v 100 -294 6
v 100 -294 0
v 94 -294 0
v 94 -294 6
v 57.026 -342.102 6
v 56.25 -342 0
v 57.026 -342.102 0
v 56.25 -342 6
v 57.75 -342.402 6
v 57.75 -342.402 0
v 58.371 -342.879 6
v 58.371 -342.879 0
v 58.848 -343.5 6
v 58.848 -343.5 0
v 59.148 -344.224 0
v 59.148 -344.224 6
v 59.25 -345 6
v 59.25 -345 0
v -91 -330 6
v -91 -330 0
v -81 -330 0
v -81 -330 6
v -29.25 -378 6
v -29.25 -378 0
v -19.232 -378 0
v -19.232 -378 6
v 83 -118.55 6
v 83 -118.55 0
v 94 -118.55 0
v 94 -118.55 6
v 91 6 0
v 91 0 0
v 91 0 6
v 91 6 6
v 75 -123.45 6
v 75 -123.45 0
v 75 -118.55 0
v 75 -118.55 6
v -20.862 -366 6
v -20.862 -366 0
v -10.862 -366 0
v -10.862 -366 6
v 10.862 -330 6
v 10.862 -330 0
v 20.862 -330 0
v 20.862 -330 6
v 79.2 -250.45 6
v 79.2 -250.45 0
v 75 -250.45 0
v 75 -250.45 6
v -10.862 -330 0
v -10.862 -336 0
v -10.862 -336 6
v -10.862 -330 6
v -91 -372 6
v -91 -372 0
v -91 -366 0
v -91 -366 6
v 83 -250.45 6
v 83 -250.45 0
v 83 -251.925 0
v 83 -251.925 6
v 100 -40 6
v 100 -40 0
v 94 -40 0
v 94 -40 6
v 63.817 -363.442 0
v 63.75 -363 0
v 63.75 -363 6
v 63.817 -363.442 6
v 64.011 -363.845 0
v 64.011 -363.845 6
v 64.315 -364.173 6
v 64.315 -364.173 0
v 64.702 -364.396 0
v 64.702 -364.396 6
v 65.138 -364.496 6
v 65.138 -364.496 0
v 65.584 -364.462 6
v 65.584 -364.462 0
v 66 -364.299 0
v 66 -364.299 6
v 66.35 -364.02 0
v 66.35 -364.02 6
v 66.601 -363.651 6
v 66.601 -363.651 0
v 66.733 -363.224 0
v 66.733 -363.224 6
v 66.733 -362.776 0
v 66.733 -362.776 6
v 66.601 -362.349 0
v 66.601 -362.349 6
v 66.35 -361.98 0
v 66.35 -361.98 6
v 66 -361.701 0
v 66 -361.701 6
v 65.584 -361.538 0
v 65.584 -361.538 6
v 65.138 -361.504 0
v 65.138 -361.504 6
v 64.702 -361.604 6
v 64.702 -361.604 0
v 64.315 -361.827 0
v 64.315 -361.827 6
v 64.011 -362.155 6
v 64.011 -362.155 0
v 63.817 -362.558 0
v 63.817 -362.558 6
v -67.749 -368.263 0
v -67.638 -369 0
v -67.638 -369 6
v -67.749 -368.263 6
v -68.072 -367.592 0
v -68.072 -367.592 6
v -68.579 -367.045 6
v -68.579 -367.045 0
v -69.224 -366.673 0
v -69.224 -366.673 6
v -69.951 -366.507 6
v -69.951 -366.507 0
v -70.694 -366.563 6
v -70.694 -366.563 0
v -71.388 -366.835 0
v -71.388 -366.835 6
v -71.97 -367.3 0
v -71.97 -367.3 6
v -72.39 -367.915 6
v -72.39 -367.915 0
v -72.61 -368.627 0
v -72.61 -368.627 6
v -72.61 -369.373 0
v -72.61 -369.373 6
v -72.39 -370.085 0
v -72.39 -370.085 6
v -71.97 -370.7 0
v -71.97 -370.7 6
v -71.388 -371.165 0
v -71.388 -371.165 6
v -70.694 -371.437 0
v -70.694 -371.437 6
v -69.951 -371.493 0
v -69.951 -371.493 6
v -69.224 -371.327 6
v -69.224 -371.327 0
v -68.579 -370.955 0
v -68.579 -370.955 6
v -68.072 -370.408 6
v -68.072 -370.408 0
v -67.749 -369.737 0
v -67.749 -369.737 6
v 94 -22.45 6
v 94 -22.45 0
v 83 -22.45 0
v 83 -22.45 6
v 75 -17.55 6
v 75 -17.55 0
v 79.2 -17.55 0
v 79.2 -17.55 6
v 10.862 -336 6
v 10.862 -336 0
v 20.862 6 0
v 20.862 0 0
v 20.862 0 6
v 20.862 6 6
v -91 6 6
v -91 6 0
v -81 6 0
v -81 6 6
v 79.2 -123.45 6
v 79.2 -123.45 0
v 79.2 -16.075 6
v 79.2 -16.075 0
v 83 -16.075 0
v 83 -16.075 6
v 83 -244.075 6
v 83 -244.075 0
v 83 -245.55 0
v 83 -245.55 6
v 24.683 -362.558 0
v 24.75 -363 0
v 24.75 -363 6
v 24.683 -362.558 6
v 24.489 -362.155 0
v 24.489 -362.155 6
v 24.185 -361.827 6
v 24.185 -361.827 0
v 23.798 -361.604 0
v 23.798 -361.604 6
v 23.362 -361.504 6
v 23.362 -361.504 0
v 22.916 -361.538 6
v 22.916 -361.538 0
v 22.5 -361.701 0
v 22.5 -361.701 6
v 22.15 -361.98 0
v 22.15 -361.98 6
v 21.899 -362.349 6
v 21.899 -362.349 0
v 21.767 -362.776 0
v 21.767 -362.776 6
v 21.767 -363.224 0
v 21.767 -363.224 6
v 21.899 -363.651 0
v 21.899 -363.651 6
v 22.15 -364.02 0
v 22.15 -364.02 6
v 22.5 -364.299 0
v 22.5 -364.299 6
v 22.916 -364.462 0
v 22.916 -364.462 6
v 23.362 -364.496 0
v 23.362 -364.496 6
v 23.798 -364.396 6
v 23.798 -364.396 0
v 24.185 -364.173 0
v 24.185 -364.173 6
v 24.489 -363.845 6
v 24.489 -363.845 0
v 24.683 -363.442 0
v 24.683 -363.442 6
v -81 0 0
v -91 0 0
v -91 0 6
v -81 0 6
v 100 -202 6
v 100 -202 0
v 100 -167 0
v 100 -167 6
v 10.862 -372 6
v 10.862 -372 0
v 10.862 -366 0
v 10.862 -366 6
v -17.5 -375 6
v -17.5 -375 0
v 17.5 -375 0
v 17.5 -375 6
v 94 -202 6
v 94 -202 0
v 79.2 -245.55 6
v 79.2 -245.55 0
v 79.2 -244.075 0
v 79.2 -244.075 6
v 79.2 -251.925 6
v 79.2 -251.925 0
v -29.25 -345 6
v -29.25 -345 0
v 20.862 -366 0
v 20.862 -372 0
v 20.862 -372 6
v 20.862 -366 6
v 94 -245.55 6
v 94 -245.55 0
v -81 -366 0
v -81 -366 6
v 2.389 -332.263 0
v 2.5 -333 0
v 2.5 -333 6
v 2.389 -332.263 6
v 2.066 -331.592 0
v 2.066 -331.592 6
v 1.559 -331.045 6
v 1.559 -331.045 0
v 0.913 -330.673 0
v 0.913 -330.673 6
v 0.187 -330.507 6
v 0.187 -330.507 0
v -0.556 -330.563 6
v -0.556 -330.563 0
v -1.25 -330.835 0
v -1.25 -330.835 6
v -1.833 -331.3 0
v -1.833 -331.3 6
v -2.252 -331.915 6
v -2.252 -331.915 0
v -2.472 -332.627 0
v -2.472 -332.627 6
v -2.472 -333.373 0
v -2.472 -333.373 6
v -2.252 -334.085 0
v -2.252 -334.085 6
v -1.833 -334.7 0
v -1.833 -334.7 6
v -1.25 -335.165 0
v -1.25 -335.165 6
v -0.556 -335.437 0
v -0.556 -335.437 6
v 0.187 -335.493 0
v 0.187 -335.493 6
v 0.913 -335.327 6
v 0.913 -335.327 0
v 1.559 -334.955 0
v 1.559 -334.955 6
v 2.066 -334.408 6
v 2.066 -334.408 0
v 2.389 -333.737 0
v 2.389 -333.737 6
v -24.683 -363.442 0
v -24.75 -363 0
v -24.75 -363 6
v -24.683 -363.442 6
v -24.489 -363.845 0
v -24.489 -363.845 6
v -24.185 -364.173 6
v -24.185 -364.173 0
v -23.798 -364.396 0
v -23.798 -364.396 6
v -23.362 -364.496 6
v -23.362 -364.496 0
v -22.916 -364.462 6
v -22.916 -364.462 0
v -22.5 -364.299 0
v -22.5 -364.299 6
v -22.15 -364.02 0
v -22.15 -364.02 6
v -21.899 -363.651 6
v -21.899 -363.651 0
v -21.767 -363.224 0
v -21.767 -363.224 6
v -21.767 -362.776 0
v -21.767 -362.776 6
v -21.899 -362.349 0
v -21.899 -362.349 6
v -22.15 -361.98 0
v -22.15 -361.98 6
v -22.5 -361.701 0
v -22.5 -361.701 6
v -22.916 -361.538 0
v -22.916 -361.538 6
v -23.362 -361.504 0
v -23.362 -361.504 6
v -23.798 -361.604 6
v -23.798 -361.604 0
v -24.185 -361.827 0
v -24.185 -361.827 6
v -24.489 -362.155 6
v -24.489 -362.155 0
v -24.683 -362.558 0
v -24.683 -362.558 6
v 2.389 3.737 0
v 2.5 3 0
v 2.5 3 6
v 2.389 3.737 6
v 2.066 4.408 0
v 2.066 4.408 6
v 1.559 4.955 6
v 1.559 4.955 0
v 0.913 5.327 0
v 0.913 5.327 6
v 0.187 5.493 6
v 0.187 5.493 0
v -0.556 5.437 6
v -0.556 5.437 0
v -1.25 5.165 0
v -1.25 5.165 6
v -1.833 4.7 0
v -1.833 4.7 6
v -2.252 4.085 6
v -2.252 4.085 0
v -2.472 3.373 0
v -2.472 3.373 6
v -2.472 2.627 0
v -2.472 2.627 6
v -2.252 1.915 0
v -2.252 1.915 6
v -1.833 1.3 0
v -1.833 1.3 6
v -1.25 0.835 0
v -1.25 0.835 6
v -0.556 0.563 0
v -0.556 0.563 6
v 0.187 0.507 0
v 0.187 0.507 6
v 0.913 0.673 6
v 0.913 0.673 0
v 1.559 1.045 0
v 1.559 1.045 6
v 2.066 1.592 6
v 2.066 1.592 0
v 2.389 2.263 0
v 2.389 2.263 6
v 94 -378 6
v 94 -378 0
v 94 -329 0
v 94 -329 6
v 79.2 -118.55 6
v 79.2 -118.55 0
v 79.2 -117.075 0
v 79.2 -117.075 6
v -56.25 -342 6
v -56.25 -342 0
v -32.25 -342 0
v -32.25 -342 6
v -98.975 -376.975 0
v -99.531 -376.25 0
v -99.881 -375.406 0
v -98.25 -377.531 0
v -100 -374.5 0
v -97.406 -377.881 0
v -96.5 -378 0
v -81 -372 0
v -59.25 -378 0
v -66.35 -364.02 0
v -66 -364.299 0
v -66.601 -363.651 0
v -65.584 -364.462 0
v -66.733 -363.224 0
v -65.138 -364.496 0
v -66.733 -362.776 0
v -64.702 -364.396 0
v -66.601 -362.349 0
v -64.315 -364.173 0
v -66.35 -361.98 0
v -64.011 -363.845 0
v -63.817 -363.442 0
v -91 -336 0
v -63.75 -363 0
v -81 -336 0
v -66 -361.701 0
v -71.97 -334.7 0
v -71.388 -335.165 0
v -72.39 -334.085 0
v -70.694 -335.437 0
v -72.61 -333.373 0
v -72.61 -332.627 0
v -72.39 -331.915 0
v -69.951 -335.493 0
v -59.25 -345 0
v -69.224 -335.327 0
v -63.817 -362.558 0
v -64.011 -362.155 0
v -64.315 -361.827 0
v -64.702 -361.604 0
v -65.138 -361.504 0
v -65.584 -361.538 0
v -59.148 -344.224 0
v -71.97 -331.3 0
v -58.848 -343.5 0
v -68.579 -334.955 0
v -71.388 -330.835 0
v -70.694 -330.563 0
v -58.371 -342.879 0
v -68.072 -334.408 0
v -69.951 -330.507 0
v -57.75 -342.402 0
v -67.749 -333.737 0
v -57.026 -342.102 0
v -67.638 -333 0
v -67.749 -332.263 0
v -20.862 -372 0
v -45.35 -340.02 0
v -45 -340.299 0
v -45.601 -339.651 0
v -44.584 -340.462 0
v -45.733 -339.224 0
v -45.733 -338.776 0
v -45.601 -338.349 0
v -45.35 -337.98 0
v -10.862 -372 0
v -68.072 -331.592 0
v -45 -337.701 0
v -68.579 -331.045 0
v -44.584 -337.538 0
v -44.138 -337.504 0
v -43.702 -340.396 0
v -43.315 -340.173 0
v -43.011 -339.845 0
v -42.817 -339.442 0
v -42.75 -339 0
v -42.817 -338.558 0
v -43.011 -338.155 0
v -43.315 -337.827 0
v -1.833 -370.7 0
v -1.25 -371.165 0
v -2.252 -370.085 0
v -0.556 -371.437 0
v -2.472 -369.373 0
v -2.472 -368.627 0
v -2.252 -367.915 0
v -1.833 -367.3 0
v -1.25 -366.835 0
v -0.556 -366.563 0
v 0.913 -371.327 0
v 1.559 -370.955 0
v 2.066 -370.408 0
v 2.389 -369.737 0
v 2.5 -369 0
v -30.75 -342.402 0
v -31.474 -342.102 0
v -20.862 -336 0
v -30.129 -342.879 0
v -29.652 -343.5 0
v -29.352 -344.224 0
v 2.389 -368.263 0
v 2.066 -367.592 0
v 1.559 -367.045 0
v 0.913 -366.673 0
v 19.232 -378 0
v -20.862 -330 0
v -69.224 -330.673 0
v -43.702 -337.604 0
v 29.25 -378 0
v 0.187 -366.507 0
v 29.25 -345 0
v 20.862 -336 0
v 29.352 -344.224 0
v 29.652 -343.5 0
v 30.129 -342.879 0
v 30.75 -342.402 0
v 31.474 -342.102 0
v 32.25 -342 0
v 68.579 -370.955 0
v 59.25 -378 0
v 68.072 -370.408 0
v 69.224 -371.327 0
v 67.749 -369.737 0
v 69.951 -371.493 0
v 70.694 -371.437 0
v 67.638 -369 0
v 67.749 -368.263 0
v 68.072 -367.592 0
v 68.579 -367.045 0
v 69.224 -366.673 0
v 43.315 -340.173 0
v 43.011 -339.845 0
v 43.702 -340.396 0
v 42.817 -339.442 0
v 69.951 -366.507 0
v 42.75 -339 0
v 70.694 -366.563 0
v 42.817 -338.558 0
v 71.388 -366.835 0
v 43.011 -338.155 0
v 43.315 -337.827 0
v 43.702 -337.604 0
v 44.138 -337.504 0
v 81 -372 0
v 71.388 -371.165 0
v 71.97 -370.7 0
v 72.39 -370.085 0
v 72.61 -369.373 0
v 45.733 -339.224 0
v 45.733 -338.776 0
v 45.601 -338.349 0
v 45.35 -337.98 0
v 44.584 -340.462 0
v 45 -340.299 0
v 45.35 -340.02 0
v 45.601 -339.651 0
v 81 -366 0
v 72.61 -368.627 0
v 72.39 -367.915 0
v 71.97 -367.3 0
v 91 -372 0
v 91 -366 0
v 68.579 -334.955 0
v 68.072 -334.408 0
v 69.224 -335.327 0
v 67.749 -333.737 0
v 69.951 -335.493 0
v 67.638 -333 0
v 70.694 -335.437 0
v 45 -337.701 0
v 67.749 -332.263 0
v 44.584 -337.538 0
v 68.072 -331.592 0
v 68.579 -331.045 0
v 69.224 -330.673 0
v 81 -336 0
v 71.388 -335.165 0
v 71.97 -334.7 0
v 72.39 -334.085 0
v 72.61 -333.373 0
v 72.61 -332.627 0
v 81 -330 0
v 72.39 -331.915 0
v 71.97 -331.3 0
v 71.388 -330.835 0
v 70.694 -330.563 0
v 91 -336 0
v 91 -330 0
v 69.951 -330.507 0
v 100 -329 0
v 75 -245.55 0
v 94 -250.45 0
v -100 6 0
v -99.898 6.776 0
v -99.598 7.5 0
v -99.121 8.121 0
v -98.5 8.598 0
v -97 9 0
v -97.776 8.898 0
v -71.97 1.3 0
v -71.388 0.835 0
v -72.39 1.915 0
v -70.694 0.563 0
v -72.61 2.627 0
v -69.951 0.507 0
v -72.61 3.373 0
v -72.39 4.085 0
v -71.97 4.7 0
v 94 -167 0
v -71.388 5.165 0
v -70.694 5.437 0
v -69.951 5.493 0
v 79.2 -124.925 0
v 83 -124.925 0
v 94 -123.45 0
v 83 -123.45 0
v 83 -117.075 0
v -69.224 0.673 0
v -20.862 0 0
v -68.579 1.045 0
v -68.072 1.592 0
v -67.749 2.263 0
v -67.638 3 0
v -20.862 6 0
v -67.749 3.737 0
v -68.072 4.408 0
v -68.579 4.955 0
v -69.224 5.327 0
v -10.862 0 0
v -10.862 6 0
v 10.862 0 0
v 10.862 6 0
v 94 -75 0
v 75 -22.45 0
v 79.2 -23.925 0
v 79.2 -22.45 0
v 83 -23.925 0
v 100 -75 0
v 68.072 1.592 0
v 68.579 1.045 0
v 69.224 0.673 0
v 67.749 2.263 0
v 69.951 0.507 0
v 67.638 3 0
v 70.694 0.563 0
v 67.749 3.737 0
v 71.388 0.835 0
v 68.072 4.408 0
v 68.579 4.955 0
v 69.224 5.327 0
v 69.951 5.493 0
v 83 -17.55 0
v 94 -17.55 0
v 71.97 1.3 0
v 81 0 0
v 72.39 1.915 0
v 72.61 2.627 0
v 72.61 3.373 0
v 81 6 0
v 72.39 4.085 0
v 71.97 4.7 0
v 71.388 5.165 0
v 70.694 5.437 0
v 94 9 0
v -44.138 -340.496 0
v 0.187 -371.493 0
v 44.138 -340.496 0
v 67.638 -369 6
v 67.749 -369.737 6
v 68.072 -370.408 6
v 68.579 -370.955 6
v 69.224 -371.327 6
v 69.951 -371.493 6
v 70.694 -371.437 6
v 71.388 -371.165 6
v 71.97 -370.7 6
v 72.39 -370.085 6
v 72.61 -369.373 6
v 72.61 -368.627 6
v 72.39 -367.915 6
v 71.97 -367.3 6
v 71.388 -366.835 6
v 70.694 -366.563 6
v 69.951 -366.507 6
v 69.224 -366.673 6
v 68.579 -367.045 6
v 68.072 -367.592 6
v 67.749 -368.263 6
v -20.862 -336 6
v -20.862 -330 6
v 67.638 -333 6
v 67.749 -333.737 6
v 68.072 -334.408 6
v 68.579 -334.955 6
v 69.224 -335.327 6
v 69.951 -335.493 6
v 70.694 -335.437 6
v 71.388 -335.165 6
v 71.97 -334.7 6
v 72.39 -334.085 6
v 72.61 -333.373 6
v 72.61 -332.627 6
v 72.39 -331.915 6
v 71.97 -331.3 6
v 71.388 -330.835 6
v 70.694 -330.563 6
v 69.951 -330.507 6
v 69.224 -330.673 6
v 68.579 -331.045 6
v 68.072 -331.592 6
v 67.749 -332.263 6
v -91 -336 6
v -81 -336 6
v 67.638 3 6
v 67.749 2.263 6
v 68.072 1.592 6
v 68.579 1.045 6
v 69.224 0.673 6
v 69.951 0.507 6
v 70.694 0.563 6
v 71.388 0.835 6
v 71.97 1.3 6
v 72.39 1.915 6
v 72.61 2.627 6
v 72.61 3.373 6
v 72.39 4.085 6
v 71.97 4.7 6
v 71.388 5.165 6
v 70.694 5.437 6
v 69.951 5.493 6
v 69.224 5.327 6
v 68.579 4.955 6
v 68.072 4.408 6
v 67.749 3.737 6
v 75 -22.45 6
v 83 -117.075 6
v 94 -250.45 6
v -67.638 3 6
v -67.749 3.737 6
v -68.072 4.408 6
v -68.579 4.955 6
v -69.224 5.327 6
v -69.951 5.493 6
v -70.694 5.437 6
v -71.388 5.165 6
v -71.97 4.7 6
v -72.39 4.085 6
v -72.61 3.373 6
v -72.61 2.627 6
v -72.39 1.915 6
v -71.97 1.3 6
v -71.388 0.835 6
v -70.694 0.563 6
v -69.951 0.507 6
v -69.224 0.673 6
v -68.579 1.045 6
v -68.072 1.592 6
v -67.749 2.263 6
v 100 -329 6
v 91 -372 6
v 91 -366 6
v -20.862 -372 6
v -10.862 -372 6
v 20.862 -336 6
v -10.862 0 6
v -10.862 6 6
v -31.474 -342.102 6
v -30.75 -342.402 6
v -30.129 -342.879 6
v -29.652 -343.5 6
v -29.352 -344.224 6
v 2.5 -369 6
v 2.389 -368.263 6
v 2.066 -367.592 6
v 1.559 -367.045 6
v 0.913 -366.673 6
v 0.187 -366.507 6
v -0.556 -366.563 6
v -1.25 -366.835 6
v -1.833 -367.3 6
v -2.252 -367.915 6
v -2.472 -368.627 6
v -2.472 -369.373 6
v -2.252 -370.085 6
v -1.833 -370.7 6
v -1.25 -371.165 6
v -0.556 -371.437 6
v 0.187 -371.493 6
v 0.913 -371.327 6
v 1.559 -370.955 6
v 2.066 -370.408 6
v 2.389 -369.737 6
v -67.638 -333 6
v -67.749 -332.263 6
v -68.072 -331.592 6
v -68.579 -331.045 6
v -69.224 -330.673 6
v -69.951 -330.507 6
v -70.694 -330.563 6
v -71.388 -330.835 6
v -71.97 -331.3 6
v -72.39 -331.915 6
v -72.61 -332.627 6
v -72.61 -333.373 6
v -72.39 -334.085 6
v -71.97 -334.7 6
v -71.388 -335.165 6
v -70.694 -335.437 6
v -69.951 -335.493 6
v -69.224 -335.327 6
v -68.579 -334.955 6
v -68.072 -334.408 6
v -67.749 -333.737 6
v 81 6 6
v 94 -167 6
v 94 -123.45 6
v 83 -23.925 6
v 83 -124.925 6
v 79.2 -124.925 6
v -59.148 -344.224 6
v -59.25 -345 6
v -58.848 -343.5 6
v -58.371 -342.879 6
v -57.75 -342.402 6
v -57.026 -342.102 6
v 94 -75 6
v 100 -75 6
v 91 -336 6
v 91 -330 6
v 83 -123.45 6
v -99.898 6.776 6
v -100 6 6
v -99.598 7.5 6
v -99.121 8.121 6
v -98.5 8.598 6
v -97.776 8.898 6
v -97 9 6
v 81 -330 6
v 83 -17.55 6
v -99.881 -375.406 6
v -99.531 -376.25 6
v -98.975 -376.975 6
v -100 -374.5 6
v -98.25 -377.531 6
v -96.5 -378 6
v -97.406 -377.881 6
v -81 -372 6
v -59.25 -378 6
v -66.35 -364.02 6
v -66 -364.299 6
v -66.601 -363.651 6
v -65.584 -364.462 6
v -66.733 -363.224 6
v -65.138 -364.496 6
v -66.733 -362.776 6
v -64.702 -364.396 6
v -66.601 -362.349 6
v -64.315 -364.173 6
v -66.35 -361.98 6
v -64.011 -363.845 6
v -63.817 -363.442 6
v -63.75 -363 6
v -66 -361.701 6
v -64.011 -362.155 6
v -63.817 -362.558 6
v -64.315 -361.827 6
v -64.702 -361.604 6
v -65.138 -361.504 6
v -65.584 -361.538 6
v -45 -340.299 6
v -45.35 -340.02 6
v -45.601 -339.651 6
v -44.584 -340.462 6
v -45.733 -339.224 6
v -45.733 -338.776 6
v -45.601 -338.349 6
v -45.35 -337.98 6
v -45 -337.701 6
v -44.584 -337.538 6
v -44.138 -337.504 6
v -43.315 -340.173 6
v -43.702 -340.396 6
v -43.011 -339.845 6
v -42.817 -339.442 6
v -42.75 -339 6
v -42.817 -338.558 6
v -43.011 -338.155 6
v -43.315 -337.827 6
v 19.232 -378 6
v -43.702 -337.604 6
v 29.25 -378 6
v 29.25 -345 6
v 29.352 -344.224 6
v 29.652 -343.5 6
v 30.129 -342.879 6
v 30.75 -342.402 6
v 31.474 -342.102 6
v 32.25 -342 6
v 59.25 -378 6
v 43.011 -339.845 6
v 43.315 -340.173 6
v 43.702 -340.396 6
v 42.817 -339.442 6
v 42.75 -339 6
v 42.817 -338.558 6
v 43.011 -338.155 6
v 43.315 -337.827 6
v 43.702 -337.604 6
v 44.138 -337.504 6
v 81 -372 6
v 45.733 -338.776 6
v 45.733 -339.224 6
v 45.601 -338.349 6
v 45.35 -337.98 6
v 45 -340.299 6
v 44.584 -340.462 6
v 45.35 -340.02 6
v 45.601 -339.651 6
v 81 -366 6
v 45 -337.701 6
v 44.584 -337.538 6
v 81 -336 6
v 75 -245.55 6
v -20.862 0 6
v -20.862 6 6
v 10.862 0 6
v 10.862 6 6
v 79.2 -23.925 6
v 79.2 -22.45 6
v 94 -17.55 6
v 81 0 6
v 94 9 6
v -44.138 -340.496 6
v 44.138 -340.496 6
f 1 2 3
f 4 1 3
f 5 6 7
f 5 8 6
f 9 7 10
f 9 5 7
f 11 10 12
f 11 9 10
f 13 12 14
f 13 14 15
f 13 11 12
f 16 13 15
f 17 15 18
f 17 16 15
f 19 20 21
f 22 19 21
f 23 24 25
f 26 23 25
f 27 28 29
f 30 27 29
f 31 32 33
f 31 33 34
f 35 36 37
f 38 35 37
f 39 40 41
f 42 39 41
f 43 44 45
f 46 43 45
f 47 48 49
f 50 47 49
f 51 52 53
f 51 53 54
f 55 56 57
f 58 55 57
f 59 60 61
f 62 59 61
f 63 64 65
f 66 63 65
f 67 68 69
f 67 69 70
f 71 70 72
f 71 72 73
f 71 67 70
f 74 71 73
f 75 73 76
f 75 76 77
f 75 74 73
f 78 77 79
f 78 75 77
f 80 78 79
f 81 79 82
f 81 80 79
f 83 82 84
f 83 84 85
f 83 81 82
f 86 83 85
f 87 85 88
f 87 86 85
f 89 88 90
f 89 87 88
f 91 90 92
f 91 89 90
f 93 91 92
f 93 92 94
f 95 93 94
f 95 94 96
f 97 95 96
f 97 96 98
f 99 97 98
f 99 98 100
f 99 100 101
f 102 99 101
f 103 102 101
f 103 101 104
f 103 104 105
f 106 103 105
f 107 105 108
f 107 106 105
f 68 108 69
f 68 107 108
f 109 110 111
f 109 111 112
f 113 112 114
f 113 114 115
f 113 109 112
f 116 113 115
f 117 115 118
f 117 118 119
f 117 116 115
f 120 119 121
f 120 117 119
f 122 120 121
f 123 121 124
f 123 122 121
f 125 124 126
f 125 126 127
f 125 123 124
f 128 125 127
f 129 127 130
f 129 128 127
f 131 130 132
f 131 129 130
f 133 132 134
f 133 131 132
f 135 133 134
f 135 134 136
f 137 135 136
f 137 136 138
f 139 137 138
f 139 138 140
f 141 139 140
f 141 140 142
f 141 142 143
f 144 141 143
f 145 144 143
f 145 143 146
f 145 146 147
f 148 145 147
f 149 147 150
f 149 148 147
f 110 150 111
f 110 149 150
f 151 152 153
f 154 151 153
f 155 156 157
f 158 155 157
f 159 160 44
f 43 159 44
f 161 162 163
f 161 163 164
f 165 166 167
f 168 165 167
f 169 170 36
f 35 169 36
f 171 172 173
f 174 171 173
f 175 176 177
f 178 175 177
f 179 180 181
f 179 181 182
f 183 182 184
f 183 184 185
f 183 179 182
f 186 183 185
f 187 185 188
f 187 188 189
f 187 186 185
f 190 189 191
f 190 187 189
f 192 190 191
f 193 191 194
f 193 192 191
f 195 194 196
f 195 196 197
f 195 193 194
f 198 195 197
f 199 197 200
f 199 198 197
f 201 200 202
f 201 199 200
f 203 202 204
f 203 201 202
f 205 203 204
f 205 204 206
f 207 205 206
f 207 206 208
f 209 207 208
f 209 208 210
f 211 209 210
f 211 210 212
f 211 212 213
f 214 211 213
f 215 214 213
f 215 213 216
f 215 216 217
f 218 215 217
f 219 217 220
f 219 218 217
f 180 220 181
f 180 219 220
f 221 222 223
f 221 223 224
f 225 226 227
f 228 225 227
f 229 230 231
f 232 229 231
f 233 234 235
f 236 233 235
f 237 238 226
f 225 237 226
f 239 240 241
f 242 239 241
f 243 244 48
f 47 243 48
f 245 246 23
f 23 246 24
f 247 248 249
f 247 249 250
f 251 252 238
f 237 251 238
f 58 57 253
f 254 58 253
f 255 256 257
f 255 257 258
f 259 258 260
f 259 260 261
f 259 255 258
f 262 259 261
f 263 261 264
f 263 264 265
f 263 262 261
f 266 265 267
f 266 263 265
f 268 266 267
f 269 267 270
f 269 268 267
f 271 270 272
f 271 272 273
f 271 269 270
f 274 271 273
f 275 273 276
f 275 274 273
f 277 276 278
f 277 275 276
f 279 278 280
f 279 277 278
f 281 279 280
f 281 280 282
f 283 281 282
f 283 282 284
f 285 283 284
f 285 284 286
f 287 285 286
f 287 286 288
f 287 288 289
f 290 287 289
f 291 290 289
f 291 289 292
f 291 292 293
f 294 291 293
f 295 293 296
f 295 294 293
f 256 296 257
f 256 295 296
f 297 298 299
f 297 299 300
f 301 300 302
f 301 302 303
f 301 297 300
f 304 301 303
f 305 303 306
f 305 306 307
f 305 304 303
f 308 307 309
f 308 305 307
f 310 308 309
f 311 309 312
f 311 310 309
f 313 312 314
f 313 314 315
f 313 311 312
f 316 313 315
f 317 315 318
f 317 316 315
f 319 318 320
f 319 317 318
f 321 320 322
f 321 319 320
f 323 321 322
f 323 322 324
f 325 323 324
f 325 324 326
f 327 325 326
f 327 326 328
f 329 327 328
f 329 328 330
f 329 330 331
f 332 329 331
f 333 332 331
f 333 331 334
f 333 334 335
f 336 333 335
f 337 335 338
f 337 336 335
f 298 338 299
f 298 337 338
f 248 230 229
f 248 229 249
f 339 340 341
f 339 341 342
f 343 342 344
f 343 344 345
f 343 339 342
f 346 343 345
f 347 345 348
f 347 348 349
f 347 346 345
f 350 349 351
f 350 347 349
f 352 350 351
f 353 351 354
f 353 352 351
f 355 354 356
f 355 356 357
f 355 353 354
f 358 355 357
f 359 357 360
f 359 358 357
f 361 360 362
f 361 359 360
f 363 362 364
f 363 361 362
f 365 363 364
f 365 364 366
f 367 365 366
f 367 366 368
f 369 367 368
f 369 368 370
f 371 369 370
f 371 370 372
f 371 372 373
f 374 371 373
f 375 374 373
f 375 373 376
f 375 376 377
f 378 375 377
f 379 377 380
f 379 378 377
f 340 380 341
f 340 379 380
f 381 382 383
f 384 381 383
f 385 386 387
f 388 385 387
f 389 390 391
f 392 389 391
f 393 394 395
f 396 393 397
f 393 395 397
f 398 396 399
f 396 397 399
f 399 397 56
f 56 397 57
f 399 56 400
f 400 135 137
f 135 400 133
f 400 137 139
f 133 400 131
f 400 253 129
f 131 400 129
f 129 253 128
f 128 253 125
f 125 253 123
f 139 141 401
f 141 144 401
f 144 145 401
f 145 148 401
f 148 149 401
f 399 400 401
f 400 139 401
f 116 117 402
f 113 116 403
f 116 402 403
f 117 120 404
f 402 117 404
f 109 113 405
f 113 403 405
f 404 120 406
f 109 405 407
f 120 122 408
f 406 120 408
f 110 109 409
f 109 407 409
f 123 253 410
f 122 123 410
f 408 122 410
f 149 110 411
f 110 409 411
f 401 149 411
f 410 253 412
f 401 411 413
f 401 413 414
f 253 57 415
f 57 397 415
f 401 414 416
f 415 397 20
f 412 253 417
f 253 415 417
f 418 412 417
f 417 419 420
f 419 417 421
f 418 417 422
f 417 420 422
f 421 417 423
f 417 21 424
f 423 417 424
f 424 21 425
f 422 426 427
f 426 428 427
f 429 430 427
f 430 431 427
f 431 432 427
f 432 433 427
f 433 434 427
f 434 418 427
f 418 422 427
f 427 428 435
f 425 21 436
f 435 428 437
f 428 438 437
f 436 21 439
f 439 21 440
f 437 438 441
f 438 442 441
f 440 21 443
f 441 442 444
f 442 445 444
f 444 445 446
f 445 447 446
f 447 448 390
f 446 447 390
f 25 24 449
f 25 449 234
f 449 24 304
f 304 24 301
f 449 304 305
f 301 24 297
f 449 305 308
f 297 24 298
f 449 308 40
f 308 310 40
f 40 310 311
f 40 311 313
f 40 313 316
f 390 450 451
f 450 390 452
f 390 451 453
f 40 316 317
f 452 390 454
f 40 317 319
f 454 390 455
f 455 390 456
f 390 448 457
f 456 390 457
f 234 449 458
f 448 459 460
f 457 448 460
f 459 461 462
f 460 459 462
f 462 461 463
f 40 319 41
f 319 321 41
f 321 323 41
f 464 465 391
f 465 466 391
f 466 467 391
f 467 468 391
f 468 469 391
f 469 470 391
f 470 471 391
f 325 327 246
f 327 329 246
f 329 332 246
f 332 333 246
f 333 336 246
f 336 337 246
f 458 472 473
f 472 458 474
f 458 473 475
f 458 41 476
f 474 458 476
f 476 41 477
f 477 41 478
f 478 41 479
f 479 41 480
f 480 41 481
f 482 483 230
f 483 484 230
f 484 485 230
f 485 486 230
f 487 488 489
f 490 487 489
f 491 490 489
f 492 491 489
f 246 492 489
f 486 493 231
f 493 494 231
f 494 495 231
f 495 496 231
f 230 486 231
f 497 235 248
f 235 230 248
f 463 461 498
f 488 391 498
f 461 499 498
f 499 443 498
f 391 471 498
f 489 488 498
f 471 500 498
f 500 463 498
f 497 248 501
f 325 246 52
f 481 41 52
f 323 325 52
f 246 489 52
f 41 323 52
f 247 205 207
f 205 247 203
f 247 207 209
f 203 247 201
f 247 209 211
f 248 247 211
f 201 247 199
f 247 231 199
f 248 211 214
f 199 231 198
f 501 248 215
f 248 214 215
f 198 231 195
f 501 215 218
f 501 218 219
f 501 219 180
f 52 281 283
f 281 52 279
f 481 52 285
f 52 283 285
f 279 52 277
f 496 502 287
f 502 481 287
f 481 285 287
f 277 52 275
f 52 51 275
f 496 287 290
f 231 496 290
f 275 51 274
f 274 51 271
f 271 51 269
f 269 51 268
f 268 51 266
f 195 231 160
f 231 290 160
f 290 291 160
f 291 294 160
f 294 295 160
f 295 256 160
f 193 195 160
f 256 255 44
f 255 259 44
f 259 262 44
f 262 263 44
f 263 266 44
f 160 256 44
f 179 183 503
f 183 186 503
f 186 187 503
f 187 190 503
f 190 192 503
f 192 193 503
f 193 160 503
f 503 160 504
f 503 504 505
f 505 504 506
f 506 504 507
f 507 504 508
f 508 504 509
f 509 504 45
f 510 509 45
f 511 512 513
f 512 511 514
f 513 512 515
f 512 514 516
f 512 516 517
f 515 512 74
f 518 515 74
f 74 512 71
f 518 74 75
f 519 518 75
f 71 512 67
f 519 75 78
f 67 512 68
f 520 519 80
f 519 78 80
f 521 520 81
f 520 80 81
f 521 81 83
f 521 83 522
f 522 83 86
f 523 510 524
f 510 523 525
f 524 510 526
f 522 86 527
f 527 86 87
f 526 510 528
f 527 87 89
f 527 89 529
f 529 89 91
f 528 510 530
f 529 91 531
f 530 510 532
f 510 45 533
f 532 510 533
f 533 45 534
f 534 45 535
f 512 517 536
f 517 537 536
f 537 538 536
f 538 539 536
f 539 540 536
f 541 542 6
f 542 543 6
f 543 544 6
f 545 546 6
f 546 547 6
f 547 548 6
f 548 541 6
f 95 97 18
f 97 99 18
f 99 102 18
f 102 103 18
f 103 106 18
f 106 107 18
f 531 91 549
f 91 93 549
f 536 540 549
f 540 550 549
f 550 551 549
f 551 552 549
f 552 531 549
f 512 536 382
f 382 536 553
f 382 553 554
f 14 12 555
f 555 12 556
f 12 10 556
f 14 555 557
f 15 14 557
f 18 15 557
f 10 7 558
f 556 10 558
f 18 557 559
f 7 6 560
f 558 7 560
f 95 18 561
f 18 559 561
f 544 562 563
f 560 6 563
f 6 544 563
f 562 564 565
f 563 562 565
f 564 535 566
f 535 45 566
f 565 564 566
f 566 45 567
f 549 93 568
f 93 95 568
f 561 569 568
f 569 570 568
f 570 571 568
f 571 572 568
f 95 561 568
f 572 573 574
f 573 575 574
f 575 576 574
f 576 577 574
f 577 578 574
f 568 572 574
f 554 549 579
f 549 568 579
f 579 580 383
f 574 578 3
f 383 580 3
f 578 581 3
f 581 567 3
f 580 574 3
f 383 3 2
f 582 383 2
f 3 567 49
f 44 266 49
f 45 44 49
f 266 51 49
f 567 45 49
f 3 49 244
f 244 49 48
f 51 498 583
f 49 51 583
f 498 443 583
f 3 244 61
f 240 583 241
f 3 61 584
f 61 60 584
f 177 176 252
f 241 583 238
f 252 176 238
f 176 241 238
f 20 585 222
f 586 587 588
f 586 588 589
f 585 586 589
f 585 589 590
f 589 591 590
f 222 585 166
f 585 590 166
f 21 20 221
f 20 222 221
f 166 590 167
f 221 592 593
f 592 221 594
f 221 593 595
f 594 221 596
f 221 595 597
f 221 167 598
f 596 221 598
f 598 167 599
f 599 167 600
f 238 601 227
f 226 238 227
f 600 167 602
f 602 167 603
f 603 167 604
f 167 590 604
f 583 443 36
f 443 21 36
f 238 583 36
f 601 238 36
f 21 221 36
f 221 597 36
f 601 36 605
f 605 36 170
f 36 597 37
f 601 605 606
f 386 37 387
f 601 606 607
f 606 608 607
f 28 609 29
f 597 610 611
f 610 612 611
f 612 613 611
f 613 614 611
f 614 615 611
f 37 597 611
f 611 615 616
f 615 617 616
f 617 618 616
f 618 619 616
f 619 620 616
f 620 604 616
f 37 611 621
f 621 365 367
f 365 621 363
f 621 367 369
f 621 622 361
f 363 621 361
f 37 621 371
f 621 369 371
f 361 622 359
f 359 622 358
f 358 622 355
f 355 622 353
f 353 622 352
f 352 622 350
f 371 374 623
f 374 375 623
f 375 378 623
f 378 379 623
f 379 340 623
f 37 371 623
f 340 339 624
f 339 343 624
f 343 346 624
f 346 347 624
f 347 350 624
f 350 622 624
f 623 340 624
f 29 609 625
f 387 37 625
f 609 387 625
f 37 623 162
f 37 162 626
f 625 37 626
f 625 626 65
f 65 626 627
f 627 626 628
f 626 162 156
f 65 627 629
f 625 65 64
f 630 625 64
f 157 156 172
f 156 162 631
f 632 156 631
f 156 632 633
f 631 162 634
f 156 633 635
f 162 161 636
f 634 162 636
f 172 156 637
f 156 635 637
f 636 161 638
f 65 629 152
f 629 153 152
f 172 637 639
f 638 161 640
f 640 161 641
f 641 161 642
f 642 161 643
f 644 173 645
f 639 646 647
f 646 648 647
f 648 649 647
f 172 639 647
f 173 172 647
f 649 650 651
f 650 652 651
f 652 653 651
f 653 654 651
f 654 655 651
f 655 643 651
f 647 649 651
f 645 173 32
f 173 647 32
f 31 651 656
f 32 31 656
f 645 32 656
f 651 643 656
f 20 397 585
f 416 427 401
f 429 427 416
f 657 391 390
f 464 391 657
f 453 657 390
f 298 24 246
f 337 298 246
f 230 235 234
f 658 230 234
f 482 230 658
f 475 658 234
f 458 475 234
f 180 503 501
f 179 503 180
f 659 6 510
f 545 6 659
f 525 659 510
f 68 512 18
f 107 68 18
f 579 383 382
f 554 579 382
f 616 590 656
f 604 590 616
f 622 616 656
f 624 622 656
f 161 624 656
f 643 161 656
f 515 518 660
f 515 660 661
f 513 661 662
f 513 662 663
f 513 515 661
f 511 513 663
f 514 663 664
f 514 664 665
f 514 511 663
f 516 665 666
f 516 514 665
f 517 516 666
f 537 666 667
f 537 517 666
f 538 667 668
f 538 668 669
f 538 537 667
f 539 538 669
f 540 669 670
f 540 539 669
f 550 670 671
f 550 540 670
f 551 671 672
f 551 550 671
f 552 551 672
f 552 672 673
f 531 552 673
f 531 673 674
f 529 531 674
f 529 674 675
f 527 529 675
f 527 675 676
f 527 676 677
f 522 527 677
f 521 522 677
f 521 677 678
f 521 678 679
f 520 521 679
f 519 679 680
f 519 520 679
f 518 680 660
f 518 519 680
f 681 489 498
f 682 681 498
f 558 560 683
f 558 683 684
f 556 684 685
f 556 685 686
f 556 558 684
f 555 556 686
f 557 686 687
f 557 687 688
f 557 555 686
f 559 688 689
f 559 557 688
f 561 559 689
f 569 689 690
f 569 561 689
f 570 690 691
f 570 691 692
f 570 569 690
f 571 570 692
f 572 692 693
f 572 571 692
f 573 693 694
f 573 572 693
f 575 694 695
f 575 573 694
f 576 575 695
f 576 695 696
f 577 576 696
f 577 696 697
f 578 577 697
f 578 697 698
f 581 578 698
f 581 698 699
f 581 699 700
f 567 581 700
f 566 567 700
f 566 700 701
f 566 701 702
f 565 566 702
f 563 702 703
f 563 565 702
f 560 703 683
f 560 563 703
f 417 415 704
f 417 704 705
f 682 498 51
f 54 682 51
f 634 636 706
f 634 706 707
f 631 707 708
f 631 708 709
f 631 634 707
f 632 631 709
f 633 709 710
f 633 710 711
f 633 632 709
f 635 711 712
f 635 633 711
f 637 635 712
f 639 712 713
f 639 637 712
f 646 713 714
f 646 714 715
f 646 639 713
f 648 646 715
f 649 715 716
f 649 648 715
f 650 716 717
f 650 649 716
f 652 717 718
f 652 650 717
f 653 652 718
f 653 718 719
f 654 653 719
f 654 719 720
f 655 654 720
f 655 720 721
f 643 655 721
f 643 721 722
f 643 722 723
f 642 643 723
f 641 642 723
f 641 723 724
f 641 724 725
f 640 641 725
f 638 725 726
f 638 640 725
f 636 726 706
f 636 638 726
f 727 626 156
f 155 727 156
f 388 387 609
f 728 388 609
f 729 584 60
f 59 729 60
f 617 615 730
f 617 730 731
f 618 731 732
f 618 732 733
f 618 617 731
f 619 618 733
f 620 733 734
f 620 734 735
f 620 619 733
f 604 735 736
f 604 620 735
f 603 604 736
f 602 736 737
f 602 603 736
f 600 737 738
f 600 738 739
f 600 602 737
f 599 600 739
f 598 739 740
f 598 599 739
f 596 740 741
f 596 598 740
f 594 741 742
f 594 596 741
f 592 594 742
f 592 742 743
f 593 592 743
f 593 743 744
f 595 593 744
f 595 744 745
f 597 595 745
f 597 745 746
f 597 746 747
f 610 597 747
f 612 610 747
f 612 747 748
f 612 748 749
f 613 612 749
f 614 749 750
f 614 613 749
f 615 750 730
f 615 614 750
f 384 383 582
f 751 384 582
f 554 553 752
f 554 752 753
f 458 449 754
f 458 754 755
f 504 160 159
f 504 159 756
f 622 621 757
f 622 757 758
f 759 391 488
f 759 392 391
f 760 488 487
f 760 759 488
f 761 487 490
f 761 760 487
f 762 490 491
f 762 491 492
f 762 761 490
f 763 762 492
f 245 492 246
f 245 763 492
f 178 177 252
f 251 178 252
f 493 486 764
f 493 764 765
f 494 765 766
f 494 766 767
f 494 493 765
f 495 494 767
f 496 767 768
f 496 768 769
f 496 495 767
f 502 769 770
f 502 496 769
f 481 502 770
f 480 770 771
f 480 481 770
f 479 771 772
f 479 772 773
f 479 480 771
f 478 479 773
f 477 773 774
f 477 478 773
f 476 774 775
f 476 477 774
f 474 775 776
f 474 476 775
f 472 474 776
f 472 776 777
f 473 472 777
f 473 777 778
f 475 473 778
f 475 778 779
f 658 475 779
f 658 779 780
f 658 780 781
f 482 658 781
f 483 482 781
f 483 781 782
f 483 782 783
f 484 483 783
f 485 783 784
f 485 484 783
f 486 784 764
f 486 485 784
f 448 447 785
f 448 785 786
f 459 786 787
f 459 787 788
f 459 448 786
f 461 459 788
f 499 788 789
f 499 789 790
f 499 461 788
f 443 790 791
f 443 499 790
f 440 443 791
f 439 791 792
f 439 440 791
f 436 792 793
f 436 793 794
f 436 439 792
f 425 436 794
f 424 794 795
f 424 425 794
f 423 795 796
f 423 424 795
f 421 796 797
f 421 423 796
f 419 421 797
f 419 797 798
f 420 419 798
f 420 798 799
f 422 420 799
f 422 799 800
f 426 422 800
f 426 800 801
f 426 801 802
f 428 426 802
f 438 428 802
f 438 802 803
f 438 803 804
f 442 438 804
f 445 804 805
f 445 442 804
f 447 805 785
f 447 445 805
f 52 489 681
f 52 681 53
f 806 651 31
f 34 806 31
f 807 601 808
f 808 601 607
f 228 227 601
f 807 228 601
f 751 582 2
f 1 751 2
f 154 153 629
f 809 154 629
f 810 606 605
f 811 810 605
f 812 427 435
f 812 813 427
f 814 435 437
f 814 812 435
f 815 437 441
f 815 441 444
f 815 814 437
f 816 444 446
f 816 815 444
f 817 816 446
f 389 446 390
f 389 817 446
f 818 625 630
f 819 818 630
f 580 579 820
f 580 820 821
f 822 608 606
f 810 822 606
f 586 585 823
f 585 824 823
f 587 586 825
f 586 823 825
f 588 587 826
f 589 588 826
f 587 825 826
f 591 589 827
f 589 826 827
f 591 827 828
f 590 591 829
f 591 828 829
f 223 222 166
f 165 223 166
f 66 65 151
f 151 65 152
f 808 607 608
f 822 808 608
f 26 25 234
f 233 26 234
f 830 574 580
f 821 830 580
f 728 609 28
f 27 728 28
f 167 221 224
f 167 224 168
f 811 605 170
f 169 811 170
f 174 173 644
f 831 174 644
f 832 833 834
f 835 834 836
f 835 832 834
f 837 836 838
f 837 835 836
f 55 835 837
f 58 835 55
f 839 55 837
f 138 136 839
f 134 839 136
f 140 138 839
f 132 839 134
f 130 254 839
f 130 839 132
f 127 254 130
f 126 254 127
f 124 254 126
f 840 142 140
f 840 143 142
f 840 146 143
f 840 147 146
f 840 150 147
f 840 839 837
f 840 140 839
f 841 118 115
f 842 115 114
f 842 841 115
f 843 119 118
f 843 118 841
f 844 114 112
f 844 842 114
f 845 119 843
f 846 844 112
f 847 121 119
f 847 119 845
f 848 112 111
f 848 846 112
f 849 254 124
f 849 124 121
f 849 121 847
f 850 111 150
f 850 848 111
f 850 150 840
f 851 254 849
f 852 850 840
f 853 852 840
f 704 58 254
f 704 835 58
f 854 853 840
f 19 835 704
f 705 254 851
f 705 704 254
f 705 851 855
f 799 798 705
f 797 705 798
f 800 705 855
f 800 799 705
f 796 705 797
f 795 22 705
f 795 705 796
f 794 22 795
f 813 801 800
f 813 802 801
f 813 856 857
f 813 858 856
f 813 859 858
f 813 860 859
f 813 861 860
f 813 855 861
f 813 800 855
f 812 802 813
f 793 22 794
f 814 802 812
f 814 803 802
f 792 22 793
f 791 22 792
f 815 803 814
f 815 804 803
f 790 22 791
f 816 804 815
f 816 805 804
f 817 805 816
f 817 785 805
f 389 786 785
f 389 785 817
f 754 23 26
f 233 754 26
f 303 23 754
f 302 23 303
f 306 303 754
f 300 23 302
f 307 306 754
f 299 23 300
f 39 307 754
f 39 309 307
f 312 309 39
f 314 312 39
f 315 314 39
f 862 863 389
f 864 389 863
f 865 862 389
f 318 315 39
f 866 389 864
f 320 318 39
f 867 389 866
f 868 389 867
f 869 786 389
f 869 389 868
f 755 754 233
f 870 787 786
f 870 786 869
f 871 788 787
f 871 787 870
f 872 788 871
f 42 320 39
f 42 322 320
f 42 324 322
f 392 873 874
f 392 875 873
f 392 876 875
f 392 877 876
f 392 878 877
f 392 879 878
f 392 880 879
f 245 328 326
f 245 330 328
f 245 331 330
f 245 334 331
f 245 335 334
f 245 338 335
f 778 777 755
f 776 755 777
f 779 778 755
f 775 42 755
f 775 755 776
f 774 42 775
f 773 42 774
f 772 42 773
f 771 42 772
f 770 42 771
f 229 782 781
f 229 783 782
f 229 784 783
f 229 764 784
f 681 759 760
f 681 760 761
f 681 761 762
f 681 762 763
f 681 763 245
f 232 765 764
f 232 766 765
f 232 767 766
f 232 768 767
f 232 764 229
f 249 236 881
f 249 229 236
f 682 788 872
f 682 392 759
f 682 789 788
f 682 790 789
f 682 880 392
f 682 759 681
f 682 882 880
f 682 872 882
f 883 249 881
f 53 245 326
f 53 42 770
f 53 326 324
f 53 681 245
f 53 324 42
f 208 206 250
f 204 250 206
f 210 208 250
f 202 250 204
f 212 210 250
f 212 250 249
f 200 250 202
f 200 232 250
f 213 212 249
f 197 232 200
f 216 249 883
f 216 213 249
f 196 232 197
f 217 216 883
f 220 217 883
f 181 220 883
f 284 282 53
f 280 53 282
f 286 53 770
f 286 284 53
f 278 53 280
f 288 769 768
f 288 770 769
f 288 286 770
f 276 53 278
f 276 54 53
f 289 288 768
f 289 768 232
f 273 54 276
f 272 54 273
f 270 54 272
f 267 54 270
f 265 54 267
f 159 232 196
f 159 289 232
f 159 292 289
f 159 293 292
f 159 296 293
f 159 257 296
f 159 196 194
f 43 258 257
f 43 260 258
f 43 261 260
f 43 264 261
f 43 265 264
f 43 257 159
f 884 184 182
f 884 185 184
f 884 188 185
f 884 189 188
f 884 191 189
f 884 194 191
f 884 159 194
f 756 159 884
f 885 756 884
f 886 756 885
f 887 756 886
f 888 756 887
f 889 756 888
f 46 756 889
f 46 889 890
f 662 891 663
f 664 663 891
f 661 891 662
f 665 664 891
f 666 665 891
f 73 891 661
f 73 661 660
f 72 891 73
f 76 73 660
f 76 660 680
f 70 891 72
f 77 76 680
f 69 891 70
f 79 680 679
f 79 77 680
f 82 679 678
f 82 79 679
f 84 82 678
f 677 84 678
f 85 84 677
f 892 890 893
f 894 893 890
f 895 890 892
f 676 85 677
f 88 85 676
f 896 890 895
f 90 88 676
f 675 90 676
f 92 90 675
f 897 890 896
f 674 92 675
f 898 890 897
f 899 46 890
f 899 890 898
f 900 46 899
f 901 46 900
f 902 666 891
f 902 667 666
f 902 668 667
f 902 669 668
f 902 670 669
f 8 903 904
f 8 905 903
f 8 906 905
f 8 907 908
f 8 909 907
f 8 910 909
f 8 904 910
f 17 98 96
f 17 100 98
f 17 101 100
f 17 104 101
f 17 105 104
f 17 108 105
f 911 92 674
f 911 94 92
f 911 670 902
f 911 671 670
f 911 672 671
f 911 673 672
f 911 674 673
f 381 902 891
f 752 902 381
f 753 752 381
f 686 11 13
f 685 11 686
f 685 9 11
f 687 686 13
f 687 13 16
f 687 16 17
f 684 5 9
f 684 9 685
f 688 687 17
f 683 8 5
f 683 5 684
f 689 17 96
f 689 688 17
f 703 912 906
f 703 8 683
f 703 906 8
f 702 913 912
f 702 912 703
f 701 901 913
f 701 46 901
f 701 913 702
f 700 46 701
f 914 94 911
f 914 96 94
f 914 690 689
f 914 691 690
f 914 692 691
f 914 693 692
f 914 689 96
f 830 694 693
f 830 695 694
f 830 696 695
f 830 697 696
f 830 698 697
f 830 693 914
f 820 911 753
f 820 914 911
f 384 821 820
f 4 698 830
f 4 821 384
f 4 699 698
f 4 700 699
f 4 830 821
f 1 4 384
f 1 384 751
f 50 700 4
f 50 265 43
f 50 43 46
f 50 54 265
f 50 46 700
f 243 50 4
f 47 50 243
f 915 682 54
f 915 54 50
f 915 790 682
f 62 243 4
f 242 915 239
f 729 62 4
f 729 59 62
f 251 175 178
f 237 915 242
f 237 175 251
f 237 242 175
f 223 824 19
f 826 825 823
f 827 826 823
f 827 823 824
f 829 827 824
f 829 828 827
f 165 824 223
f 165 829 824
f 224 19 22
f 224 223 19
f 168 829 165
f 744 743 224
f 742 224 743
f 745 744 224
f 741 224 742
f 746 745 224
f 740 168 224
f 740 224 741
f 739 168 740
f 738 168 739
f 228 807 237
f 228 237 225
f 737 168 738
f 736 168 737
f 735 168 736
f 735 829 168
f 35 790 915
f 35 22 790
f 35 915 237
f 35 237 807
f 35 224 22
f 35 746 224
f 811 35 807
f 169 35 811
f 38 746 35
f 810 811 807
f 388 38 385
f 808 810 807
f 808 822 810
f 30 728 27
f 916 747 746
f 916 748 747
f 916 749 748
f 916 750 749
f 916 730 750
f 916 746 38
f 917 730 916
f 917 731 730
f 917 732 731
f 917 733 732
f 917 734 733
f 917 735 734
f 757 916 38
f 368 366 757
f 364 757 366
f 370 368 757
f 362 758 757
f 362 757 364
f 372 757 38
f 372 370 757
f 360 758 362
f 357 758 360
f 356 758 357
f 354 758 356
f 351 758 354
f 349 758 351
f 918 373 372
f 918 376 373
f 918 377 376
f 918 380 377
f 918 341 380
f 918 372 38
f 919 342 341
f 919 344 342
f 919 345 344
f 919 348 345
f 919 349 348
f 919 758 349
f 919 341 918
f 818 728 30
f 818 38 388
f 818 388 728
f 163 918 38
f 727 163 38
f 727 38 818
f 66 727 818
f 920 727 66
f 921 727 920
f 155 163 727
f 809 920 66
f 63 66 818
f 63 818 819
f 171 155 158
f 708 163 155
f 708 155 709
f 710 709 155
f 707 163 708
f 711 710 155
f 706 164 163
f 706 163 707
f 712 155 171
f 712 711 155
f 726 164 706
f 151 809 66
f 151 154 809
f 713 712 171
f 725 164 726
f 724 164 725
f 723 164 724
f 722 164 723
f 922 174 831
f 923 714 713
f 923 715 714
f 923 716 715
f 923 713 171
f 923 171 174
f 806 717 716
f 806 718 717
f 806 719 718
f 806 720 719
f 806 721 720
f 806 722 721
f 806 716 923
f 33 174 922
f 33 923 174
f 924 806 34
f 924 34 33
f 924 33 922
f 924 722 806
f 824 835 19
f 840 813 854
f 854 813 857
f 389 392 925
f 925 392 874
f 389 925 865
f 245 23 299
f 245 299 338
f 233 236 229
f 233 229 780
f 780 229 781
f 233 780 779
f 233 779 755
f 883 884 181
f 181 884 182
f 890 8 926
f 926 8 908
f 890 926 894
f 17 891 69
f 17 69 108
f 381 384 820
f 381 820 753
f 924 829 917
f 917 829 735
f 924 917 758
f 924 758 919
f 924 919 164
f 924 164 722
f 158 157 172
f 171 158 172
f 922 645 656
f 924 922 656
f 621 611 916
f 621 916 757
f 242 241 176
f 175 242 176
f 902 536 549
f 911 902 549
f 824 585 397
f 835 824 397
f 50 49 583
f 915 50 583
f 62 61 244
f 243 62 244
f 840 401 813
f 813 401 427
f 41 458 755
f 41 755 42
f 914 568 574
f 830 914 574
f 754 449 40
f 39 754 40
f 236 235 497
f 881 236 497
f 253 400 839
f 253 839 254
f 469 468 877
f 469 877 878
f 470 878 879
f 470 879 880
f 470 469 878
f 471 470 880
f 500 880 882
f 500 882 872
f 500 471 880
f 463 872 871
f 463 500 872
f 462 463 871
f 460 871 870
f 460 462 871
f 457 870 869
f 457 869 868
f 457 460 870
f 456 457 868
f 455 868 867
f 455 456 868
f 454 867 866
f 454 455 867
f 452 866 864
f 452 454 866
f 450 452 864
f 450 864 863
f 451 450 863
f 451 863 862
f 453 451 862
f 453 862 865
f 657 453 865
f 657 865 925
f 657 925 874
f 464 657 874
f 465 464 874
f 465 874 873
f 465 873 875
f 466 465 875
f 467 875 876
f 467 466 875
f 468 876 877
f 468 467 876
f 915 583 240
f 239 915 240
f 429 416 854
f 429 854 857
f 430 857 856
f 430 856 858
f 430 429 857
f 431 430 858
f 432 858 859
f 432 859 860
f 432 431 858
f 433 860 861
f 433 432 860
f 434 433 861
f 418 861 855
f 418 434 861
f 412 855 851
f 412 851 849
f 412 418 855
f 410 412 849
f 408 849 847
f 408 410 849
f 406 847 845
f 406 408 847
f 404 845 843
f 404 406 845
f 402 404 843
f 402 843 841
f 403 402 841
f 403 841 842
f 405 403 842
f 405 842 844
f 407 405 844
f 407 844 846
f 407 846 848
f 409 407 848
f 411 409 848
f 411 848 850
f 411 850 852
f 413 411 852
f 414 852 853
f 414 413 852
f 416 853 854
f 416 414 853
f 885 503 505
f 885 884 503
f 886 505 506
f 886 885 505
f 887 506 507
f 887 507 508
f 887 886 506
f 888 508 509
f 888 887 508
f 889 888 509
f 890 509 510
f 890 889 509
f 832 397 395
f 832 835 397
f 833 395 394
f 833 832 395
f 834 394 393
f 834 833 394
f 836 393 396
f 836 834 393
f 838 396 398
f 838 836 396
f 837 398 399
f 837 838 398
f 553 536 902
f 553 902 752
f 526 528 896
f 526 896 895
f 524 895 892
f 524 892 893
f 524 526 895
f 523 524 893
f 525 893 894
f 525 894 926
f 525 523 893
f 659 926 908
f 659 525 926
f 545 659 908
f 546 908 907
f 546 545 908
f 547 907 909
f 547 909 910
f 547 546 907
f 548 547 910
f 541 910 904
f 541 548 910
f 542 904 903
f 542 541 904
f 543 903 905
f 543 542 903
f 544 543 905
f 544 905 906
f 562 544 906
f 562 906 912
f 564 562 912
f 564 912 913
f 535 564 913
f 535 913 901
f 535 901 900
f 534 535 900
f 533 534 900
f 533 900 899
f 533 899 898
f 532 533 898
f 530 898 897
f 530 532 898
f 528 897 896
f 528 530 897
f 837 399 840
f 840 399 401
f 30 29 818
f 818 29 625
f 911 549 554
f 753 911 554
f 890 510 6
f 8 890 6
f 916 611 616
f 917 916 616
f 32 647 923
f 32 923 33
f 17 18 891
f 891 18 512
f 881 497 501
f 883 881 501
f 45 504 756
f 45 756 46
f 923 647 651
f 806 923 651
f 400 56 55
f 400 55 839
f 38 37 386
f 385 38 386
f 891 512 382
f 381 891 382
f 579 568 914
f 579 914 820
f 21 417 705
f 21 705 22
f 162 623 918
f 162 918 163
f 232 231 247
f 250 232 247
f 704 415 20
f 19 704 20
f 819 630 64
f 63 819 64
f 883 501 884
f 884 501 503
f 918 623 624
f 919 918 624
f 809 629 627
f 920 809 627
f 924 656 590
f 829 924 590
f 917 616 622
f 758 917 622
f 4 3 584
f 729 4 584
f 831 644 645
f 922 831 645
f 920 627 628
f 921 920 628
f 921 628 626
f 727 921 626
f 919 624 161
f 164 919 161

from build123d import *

# Parameters (mm, degrees)
SKETCH_1_R      = 2.5
SKETCH_1_R_2    = 1.5
SKETCH_1_W      = 10
SKETCH_1_H      = 6
EXTRUDE_1_DEPTH = 6
FILLET_1_R      = 3
FILLET_2_R      = 3.5


with BuildPart() as part:
    # Эскиз1 → Бобышка-Вытянуть1 (new body)
    with BuildSketch(Plane.XY):
        Polygon((-100, 9), (-100, -378), (-59.25, -378), (-59.25, -342), (-29.25, -342), (-29.25, -378), (-19.232050808, -378), (-17.5, -375), (17.5, -375), (19.232050808, -378), (29.25, -378), (29.25, -342), (59.25, -342), (59.25, -378), (94, -378), (94, -329), (100, -329), (100, -294), (94, -294), (94, -250.45), (83, -250.45), (83, -251.925), (79.2, -251.925), (79.2, -250.45), (75, -250.45), (75, -245.55), (79.2, -245.55), (79.2, -244.075), (83, -244.075), (83, -245.55), (94, -245.55), (94, -202), (100, -202), (100, -167), (94, -167), (94, -123.45), (83, -123.45), (83, -124.925), (79.2, -124.925), (79.2, -123.45), (75, -123.45), (75, -118.55), (79.2, -118.55), (79.2, -117.075), (83, -117.075), (83, -118.55), (94, -118.55), (94, -75), (100, -75), (100, -40), (94, -40), (94, -22.45), (83, -22.45), (83, -23.925), (79.2, -23.925), (79.2, -22.45), (75, -22.45), (75, -17.55), (79.2, -17.55), (79.2, -16.075), (83, -16.075), (83, -17.55), (94, -17.55), (94, 9), align=None)
        with Locations((-70.1375, 3)):
            Circle(SKETCH_1_R, mode=Mode.SUBTRACT)
        with Locations((0, 3)):
            Circle(SKETCH_1_R, mode=Mode.SUBTRACT)
        with Locations(Location((70.1375, 3, 0), (0, 0, 180))):
            Circle(SKETCH_1_R, mode=Mode.SUBTRACT)
        with Locations((-70.1375, -333)):
            Circle(SKETCH_1_R, mode=Mode.SUBTRACT)
        with Locations((0, -333)):
            Circle(SKETCH_1_R, mode=Mode.SUBTRACT)
        with Locations(Location((70.1375, -333, 0), (0, 0, 180))):
            Circle(SKETCH_1_R, mode=Mode.SUBTRACT)
        with Locations((-70.1375, -369)):
            Circle(SKETCH_1_R, mode=Mode.SUBTRACT)
        with Locations((0, -369)):
            Circle(SKETCH_1_R, mode=Mode.SUBTRACT)
        with Locations(Location((70.1375, -369, 0), (0, 0, 180))):
            Circle(SKETCH_1_R, mode=Mode.SUBTRACT)
        with Locations((-65.25, -363)):
            Circle(SKETCH_1_R_2, mode=Mode.SUBTRACT)
        with Locations((-44.25, -339)):
            Circle(SKETCH_1_R_2, mode=Mode.SUBTRACT)
        with Locations(Location((-23.25, -363, 0), (0, 0, 180))):
            Circle(SKETCH_1_R_2, mode=Mode.SUBTRACT)
        with Locations((23.25, -363)):
            Circle(SKETCH_1_R_2, mode=Mode.SUBTRACT)
        with Locations(Location((44.25, -339, 0), (0, 0, 180))):
            Circle(SKETCH_1_R_2, mode=Mode.SUBTRACT)
        with Locations(Location((65.25, -363, 0), (0, 0, 180))):
            Circle(SKETCH_1_R_2, mode=Mode.SUBTRACT)
        with Locations((86, 3)):
            Rectangle(SKETCH_1_W, SKETCH_1_H, mode=Mode.SUBTRACT)
        with Locations((15.8625, 3)):
            Rectangle(SKETCH_1_W, SKETCH_1_H, mode=Mode.SUBTRACT)
        with Locations((-15.8625, 3)):
            Rectangle(SKETCH_1_W, SKETCH_1_H, mode=Mode.SUBTRACT)
        with Locations((-86, 3)):
            Rectangle(SKETCH_1_W, SKETCH_1_H, mode=Mode.SUBTRACT)
        with Locations((86, -333)):
            Rectangle(SKETCH_1_W, SKETCH_1_H, mode=Mode.SUBTRACT)
        with Locations((15.8625, -333)):
            Rectangle(SKETCH_1_W, SKETCH_1_H, mode=Mode.SUBTRACT)
        with Locations((-15.8625, -333)):
            Rectangle(SKETCH_1_W, SKETCH_1_H, mode=Mode.SUBTRACT)
        with Locations((-86, -333)):
            Rectangle(SKETCH_1_W, SKETCH_1_H, mode=Mode.SUBTRACT)
        with Locations((86, -369)):
            Rectangle(SKETCH_1_W, SKETCH_1_H, mode=Mode.SUBTRACT)
        with Locations((15.8625, -369)):
            Rectangle(SKETCH_1_W, SKETCH_1_H, mode=Mode.SUBTRACT)
        with Locations((-15.8625, -369)):
            Rectangle(SKETCH_1_W, SKETCH_1_H, mode=Mode.SUBTRACT)
        with Locations((-86, -369)):
            Rectangle(SKETCH_1_W, SKETCH_1_H, mode=Mode.SUBTRACT)
    extrude(amount=EXTRUDE_1_DEPTH)

    # Скругление1
    fillet_1_edges = [part.edges().sort_by_distance(p)[0] for p in [
        (59.25, -342, 3),
        (29.25, -342, 3),
        (-29.25, -342, 3),
        (-59.25, -342, 3),
        (-100, 9, 3),
    ]]
    fillet(fillet_1_edges, radius=FILLET_1_R)

    # Скругление2
    fillet_2_edges = [part.edges().sort_by_distance(p)[0] for p in [
        (-100, -378, 3),
    ]]
    fillet(fillet_2_edges, radius=FILLET_2_R)


solid = part.part
